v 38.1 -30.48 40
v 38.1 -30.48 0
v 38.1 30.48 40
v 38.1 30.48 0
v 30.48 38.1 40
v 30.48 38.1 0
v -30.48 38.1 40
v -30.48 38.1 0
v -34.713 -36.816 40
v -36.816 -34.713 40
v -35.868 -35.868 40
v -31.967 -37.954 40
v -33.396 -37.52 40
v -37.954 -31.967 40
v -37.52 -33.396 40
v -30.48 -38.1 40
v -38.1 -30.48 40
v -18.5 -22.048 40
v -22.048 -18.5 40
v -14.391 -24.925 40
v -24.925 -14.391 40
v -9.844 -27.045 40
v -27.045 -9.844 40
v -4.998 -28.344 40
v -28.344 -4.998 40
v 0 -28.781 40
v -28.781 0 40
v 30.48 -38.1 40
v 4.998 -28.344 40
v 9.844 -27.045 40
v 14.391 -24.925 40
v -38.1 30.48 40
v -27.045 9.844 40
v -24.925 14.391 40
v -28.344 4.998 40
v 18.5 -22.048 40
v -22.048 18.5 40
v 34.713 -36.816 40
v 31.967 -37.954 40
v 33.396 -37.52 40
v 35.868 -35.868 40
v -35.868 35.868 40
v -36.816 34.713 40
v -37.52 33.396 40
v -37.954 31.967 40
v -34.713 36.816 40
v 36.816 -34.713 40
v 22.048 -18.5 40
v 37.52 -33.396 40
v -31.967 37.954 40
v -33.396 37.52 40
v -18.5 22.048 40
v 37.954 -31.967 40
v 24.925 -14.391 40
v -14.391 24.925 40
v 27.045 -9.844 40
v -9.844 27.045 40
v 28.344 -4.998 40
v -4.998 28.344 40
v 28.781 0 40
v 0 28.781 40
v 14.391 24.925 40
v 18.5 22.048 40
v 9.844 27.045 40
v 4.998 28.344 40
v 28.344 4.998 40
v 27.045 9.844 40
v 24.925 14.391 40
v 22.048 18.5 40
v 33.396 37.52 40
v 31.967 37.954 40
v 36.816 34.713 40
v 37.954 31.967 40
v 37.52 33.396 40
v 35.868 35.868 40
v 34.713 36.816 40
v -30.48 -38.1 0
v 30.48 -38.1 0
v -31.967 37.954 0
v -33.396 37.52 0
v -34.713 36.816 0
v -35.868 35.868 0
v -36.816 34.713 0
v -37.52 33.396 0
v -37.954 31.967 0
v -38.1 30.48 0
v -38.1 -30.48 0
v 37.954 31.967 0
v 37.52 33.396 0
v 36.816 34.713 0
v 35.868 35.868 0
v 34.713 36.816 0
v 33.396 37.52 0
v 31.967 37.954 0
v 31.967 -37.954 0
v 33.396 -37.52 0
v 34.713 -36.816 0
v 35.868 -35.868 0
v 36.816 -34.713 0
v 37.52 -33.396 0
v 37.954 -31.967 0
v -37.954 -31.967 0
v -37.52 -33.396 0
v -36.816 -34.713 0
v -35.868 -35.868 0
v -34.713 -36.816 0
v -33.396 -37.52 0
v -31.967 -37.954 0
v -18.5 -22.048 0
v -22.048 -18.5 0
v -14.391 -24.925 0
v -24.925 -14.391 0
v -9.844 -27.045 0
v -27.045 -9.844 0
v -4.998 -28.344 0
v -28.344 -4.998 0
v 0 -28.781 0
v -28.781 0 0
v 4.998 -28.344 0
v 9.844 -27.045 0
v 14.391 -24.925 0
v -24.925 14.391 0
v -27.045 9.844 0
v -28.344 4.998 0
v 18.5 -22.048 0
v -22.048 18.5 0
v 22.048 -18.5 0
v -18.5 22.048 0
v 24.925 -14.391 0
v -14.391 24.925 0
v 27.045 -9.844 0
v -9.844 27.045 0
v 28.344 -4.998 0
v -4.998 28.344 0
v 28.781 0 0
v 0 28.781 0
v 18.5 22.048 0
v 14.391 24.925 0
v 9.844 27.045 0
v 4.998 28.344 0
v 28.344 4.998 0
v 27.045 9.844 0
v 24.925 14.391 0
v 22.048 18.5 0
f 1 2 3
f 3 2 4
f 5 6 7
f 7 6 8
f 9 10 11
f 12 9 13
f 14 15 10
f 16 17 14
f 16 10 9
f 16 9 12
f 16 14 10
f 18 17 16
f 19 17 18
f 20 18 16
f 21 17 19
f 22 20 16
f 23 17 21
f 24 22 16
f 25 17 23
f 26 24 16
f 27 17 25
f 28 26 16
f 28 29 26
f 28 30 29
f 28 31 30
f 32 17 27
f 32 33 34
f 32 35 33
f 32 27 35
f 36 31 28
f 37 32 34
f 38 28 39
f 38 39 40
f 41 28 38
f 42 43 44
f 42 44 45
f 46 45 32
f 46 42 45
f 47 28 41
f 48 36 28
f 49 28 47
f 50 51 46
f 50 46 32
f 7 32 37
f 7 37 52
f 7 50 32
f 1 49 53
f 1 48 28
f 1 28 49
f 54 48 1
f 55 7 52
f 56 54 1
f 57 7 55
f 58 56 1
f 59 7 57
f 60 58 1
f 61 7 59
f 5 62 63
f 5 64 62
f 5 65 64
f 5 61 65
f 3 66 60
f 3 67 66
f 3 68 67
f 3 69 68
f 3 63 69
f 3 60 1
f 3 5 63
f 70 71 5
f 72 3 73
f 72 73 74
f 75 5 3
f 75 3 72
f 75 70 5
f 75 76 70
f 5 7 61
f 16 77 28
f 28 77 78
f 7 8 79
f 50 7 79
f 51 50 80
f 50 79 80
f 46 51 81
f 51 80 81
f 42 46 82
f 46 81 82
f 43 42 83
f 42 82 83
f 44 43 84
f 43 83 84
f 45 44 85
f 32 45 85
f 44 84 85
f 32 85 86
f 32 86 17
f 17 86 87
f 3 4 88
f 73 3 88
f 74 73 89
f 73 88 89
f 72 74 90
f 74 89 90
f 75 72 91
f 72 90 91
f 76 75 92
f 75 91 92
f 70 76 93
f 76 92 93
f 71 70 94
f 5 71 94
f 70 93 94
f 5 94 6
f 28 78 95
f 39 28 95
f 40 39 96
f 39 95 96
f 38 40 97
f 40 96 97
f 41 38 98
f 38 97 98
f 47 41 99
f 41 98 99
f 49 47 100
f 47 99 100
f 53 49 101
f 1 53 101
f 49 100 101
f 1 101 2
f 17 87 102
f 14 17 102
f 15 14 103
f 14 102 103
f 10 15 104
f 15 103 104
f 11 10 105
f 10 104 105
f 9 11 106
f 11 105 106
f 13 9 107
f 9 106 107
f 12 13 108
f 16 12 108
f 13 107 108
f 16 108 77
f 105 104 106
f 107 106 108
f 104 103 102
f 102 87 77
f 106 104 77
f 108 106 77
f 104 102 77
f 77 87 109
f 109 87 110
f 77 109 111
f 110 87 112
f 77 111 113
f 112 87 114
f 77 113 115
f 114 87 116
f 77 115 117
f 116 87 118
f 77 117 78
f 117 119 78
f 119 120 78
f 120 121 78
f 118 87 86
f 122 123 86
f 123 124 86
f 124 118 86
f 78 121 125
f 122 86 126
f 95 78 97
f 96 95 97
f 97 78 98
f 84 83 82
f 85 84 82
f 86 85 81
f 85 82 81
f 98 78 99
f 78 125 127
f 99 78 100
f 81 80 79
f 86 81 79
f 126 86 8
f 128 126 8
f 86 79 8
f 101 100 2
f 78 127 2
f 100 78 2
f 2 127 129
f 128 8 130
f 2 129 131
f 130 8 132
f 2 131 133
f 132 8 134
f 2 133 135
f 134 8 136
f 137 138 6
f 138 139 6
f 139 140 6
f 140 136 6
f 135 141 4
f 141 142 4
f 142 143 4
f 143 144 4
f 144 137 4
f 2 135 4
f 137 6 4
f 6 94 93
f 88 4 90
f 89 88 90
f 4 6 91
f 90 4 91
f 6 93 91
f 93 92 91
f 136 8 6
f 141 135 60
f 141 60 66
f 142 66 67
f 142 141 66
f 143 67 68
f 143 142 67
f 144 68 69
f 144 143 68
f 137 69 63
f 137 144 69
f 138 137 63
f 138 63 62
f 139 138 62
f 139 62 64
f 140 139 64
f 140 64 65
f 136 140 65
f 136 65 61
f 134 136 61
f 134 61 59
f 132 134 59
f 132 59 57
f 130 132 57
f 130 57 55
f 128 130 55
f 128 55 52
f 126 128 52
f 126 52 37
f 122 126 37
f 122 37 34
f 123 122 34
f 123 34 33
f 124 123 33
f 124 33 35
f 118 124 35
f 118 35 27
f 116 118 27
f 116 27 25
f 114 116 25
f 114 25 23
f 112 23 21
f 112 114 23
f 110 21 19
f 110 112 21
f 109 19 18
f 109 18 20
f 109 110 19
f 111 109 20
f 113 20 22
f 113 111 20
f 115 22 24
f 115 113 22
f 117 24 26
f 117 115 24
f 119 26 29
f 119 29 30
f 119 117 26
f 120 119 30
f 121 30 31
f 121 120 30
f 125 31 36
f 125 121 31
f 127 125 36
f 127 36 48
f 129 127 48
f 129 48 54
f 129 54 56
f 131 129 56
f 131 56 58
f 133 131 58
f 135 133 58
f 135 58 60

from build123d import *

# Parameters (mm, degrees)
F0_R      = 28.781011
F1_DEPTH  = 40
F1_FACE_R = 28.781011
F2_DEPTH  = 10
F3_DEPTH  = 20


with BuildPart() as f1:
    # F0 (on Top) → F1 (new body)
    with BuildSketch(Plane.XY):
        with BuildLine():
            Line((30.48, 38.1), (-30.48, 38.1))
            ThreePointArc((-30.48, 38.1), (-35.868154, 35.868154), (-38.1, 30.48))
            Line((-38.1, 30.48), (-38.1, -30.48))
            ThreePointArc((-38.1, -30.48), (-35.868154, -35.868154), (-30.48, -38.1))
            Line((-30.48, -38.1), (30.48, -38.1))
            ThreePointArc((30.48, -38.1), (35.868154, -35.868154), (38.1, -30.48))
            Line((38.1, -30.48), (38.1, 30.48))
            ThreePointArc((38.1, 30.48), (35.868154, 35.868154), (30.48, 38.1))
        make_face()
        Circle(F0_R, mode=Mode.SUBTRACT)
    extrude(amount=F1_DEPTH)

    # F1_face (on face) → F2 (join)
    with BuildSketch(Plane(origin=(0, 0, 0), x_dir=(1, 0, 0), z_dir=(0, 0, -1))):
        with BuildLine():
            Line((-30.48, -38.1), (30.48, -38.1))
            ThreePointArc((30.48, -38.1), (35.868154, -35.868154), (38.1, -30.48))
            Line((38.1, -30.48), (38.1, 30.48))
            ThreePointArc((38.1, 30.48), (35.868154, 35.868154), (30.48, 38.1))
            Line((30.48, 38.1), (-30.48, 38.1))
            ThreePointArc((-30.48, 38.1), (-35.868154, 35.868154), (-38.1, 30.48))
            Line((-38.1, 30.48), (-38.1, -30.48))
            ThreePointArc((-38.1, -30.48), (-35.868154, -35.868154), (-30.48, -38.1))
        make_face()
        Circle(F1_FACE_R, mode=Mode.SUBTRACT)
    extrude(amount=-F2_DEPTH)

    # F0 (on Top) → F3 (join)
    with BuildSketch(Plane.XY):
        with BuildLine():
            Line((30.48, 38.1), (-30.48, 38.1))
            ThreePointArc((-30.48, 38.1), (-35.868154, 35.868154), (-38.1, 30.48))
            Line((-38.1, 30.48), (-38.1, -30.48))
            ThreePointArc((-38.1, -30.48), (-35.868154, -35.868154), (-30.48, -38.1))
            Line((-30.48, -38.1), (30.48, -38.1))
            ThreePointArc((30.48, -38.1), (35.868154, -35.868154), (38.1, -30.48))
            Line((38.1, -30.48), (38.1, 30.48))
            ThreePointArc((38.1, 30.48), (35.868154, 35.868154), (30.48, 38.1))
        make_face()
        Circle(F0_R, mode=Mode.SUBTRACT)
    extrude(amount=F3_DEPTH)


solid = f1.part
